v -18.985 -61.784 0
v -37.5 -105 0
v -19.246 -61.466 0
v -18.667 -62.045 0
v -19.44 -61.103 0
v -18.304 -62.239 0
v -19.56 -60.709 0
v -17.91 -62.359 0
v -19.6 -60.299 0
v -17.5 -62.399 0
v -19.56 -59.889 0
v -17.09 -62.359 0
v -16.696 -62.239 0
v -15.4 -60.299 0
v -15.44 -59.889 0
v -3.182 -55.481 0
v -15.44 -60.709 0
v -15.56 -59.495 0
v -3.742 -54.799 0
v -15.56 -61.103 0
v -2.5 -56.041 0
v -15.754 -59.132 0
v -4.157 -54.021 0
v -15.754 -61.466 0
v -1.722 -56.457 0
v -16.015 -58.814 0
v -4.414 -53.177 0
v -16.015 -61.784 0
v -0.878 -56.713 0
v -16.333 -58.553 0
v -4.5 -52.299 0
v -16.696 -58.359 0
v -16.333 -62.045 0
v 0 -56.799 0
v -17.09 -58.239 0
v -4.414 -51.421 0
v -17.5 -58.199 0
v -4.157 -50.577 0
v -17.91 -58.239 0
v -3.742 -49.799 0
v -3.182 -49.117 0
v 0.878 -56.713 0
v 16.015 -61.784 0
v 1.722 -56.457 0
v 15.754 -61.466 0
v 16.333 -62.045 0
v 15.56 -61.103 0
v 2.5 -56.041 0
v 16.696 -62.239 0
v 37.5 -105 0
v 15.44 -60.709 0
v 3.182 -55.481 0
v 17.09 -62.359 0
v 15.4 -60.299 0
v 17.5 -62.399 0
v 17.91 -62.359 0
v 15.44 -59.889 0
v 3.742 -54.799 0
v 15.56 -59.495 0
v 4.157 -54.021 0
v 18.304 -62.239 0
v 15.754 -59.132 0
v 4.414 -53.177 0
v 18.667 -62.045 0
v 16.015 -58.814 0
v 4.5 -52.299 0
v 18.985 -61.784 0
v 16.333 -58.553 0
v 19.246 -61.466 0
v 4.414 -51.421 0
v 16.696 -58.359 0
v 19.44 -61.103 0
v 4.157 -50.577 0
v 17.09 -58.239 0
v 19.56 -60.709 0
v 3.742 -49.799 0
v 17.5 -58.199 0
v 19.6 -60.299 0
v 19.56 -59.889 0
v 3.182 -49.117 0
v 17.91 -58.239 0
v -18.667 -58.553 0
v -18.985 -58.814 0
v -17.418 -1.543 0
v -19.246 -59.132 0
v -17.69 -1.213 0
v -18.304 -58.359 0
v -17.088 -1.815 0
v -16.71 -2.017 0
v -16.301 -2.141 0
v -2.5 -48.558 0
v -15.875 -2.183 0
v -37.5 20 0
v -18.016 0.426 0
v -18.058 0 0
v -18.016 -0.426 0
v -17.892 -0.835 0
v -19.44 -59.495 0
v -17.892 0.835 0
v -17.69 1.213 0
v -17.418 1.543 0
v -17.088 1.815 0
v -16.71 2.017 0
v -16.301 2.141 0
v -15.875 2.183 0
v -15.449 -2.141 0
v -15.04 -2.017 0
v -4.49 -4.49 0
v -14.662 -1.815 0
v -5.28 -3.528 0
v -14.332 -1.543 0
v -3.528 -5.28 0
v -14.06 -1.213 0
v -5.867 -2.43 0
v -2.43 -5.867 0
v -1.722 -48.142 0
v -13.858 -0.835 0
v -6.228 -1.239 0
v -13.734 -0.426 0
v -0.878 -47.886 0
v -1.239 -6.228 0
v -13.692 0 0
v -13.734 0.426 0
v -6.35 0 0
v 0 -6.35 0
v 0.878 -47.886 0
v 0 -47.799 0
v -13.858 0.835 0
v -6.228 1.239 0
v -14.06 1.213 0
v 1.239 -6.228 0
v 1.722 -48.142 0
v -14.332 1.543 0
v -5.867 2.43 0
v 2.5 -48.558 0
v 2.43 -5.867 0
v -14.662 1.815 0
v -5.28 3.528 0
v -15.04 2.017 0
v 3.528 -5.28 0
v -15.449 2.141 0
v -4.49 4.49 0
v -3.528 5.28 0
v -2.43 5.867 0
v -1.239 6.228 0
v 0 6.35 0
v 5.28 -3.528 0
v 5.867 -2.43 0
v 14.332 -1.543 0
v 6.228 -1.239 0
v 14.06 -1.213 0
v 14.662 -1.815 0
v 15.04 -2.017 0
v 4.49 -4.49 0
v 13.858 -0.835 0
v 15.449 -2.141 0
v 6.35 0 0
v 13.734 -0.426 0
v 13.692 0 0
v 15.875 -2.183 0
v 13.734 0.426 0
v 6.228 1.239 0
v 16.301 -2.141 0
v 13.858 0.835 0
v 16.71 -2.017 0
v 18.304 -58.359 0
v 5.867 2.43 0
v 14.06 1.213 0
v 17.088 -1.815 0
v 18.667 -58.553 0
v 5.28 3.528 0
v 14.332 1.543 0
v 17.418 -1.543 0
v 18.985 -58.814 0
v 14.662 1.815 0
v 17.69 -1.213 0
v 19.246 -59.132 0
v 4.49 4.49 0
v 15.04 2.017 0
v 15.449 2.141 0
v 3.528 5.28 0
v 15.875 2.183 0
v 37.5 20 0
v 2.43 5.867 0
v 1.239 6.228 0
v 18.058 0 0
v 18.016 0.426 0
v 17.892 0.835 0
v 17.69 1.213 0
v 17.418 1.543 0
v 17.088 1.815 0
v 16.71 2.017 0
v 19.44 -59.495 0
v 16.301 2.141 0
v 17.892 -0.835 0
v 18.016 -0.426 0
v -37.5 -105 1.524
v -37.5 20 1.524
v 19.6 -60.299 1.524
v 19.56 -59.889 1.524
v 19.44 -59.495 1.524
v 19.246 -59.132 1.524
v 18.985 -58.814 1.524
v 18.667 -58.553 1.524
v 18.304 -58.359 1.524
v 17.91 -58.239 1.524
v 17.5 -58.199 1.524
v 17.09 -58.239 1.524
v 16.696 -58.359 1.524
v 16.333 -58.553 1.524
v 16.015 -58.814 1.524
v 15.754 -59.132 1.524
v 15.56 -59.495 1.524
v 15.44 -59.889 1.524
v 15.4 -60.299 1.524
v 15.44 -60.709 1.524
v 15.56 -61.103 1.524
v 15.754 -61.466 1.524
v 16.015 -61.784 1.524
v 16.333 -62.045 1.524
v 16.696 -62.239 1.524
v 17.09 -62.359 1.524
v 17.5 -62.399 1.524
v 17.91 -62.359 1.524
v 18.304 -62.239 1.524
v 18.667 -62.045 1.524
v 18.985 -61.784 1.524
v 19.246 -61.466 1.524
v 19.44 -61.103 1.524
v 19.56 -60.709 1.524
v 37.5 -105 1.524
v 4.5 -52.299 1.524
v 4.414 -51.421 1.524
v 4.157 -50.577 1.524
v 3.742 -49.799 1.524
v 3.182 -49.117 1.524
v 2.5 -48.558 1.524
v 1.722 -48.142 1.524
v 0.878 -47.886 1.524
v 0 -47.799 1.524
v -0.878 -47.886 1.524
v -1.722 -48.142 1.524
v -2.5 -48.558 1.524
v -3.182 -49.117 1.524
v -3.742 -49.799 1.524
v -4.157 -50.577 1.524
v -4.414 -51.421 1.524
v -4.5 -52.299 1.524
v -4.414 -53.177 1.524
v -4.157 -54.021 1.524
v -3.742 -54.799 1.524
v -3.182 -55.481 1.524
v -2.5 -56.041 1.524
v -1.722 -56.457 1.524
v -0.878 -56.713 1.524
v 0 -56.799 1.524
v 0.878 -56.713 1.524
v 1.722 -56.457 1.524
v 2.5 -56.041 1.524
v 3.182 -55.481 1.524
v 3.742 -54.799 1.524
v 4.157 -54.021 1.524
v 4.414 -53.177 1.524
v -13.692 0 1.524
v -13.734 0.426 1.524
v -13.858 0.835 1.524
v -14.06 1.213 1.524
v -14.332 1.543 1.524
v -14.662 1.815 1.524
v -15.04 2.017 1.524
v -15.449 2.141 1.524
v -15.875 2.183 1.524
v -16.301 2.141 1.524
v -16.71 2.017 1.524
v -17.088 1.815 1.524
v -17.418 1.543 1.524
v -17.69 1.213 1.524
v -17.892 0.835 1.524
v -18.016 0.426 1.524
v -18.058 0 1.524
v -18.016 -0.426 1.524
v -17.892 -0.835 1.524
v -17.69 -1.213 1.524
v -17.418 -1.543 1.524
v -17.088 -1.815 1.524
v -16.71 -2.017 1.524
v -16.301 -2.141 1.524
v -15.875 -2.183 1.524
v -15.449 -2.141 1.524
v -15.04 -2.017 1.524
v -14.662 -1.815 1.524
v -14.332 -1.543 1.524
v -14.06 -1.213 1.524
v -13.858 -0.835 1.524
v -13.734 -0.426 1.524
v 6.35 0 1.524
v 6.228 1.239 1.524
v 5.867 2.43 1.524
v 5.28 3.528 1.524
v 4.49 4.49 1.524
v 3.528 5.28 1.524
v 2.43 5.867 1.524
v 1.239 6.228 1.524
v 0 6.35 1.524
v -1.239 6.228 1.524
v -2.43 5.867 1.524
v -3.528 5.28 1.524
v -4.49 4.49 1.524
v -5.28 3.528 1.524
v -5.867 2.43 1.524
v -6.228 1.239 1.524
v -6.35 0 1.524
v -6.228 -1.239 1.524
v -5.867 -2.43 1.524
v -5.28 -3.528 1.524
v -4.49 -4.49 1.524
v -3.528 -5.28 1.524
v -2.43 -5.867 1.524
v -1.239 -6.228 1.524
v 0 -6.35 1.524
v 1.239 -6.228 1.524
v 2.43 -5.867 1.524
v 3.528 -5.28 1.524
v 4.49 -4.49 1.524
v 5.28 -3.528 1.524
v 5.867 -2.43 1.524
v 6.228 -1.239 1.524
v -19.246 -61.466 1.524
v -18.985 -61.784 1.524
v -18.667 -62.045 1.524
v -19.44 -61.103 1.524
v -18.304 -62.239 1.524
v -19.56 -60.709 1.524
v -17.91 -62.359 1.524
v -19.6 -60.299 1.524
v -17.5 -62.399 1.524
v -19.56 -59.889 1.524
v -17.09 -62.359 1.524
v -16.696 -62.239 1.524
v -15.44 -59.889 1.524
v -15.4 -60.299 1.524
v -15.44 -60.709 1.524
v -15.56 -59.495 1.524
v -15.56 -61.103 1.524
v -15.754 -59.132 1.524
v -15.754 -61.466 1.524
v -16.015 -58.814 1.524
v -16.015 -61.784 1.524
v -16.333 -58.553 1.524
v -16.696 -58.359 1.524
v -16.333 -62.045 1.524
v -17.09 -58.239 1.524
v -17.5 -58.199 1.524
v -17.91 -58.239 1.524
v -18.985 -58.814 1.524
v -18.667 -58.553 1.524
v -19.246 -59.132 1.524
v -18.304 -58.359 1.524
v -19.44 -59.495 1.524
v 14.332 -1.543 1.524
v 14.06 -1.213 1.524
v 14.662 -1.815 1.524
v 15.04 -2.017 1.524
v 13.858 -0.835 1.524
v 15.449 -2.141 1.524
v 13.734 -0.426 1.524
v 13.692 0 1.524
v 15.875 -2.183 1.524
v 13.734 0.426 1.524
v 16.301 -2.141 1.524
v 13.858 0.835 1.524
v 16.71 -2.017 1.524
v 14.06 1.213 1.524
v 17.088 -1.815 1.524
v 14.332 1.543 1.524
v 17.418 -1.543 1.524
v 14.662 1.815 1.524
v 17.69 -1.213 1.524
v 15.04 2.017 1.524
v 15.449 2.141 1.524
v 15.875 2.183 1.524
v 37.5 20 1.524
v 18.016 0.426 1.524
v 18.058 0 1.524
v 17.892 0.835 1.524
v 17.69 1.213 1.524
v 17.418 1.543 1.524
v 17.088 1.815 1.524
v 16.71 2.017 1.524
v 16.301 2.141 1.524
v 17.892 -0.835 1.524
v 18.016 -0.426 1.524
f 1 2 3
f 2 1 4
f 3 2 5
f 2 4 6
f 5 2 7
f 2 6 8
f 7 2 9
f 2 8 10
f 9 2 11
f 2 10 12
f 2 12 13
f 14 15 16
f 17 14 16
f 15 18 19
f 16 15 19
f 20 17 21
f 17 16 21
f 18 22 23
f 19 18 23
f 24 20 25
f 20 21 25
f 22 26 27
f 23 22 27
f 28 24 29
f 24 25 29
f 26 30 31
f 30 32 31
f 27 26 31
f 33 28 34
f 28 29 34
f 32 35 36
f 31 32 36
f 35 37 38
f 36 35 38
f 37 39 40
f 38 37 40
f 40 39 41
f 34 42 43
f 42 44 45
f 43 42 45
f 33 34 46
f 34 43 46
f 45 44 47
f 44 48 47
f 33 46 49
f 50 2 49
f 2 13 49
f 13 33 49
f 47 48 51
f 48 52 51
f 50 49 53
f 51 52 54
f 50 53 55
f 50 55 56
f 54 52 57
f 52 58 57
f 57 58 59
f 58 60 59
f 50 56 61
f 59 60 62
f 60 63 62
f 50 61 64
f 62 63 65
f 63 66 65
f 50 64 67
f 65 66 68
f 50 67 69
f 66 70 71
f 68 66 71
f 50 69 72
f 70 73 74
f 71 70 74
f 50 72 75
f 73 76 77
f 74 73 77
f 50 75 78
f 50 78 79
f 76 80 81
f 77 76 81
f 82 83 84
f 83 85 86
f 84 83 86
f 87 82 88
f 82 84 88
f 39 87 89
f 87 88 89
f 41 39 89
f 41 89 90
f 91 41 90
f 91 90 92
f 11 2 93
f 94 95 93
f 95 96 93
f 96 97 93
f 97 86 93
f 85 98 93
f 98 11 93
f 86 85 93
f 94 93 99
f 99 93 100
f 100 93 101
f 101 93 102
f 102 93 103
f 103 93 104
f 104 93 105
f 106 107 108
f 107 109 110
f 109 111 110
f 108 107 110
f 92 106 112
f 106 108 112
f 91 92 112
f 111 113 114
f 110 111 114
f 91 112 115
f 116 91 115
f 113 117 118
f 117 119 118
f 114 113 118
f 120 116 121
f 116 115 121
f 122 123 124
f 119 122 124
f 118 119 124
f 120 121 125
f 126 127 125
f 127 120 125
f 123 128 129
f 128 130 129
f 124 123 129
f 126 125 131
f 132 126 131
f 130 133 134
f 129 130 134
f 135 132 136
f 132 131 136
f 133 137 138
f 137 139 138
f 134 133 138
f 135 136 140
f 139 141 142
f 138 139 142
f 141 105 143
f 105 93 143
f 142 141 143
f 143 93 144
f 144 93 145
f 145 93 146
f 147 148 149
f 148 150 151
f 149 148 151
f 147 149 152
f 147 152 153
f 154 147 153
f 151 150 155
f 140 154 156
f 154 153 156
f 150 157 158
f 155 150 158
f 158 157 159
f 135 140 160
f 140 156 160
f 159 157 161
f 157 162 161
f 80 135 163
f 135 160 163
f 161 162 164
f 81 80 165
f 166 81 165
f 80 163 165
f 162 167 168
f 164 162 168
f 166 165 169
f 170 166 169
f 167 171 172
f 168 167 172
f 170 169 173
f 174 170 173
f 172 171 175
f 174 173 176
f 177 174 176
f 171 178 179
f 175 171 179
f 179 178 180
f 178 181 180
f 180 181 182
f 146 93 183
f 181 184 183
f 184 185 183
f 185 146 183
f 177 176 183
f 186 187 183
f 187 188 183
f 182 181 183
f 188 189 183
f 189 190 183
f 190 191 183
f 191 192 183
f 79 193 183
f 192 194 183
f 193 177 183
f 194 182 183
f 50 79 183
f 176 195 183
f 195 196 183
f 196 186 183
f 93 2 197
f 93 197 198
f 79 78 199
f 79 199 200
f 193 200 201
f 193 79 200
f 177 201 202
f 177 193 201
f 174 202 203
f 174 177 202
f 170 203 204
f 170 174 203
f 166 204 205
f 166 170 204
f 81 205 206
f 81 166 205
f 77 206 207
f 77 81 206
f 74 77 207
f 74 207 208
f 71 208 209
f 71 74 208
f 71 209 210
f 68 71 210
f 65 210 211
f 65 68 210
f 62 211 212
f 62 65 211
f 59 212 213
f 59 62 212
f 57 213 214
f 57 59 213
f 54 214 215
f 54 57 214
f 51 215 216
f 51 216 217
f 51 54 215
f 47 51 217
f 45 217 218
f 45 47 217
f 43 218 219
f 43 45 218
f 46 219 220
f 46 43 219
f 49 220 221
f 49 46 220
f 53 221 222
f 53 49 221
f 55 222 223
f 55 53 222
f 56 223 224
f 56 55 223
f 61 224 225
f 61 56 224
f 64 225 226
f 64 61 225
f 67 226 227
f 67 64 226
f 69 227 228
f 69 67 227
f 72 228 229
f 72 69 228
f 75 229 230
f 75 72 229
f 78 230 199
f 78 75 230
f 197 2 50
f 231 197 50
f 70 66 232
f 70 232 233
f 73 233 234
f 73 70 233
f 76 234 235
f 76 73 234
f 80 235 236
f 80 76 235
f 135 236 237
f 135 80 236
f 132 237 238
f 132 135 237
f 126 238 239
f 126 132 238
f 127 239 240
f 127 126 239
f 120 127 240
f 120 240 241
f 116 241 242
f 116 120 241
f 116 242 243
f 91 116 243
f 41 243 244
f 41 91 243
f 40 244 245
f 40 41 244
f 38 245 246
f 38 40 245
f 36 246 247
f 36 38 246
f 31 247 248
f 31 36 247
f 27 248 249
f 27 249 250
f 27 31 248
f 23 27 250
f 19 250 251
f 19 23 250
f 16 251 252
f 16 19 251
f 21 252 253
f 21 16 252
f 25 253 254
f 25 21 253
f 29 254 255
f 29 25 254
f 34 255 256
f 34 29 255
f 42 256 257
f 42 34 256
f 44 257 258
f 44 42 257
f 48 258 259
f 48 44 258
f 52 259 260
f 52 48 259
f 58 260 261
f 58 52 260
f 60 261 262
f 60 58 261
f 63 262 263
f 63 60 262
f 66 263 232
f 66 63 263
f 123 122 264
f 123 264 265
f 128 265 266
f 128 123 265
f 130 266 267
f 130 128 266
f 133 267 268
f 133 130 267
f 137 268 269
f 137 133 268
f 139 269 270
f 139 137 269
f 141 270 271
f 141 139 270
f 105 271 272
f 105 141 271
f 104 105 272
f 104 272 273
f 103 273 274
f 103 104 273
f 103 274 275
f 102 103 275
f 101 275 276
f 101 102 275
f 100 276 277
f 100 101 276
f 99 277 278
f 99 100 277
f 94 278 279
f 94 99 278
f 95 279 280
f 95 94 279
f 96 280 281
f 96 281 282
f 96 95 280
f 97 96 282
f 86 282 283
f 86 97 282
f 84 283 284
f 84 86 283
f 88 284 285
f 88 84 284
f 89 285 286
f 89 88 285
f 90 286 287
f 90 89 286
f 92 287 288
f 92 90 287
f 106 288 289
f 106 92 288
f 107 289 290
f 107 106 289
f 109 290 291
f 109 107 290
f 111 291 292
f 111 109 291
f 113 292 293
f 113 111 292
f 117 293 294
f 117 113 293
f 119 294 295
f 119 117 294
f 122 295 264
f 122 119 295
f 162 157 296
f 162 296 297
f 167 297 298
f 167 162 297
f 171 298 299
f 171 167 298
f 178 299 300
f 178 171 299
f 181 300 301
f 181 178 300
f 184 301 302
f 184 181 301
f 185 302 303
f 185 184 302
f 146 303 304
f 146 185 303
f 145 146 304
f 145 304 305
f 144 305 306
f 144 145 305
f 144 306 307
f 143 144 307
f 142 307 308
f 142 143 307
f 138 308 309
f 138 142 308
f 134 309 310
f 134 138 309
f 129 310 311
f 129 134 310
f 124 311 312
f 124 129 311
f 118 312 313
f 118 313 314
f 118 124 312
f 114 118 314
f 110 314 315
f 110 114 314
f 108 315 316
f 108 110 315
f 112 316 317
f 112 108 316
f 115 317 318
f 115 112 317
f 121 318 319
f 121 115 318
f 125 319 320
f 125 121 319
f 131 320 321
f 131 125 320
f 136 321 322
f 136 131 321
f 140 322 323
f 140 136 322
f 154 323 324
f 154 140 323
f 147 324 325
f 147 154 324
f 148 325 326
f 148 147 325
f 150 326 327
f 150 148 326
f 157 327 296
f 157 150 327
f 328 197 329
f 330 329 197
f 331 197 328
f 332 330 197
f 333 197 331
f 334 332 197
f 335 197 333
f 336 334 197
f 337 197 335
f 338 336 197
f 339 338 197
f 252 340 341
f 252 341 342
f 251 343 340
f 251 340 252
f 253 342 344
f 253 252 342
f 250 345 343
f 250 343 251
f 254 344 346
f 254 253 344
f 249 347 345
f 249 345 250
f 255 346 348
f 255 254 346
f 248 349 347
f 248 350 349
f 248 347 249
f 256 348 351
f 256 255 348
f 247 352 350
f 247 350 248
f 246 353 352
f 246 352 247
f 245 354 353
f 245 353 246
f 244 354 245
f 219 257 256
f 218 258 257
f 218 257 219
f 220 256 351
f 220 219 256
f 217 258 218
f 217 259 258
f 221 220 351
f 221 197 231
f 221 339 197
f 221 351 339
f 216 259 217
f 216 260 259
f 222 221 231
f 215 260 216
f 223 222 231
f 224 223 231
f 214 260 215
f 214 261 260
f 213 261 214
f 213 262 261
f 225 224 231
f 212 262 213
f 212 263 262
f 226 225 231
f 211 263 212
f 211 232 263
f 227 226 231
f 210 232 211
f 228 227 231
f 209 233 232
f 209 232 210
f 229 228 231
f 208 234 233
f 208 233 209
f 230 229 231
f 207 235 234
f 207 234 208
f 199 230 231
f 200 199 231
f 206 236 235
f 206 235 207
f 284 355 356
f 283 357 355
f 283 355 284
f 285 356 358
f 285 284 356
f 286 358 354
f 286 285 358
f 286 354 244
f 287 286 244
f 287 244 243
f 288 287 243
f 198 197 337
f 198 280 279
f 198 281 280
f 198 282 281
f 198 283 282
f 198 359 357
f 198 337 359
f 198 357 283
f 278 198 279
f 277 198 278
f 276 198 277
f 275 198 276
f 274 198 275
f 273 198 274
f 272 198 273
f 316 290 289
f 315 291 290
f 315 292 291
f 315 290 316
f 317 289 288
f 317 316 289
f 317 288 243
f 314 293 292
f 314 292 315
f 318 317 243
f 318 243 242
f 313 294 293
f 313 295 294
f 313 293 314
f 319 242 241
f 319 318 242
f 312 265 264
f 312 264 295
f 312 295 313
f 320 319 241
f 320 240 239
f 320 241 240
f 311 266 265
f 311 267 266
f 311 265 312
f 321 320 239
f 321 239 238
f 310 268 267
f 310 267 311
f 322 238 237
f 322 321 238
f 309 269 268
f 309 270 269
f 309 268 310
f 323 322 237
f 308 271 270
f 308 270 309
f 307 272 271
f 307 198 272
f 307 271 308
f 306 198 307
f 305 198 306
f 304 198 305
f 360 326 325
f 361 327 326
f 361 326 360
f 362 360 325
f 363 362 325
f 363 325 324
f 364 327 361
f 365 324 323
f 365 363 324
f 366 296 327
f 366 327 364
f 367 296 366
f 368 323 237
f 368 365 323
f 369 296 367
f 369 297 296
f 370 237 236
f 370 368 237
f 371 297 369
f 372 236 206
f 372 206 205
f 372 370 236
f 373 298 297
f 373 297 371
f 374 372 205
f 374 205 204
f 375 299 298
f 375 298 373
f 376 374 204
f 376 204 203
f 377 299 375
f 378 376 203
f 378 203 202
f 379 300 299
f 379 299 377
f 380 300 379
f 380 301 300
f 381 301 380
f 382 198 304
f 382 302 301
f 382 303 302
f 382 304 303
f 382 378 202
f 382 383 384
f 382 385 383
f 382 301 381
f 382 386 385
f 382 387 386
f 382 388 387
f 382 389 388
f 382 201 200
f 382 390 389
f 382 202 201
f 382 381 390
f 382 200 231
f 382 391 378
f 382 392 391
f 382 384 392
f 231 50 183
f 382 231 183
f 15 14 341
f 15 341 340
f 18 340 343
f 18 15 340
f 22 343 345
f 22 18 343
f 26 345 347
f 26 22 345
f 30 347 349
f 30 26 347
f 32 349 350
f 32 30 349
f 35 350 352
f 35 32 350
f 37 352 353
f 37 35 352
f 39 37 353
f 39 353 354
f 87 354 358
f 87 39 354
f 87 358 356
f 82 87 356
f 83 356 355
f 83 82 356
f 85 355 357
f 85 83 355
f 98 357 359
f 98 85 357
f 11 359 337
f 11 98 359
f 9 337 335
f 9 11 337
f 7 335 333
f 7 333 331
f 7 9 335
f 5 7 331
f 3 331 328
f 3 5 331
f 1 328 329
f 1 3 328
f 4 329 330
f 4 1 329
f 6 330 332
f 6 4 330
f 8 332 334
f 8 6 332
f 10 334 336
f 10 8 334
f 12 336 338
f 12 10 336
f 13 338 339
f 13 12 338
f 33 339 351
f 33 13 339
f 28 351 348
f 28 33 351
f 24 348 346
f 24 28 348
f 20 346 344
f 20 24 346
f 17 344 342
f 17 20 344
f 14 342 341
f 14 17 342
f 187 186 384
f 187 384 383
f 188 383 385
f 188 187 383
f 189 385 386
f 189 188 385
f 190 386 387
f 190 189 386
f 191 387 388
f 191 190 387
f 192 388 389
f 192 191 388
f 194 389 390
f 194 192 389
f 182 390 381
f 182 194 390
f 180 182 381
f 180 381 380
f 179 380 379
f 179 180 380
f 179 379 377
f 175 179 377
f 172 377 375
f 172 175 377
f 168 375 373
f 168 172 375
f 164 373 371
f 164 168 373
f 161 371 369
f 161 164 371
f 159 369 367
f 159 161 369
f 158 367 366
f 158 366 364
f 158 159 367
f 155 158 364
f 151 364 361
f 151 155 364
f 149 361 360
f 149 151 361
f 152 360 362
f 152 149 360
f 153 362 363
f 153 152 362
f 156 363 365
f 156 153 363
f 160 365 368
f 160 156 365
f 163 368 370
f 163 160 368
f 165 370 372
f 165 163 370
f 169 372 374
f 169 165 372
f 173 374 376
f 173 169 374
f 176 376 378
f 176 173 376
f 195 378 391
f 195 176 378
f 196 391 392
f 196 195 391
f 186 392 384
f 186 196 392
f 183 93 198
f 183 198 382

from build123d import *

# Parameters (mm, degrees)
SKETCH1_W           = 75
SKETCH1_H           = 125
SKETCH1_R           = 4.5
SKETCH1_R_2         = 6.35
SKETCH1_R_3         = 2.1
SKETCH1_R_4         = 2.1828125
BOSS_EXTRUDE1_DEPTH = 1.524


with BuildPart() as part:
    # Sketch1 → Boss-Extrude1 (new body)
    with BuildSketch(Plane.XY):
        with Locations((0, -42.5)):
            Rectangle(SKETCH1_W, SKETCH1_H)
        with Locations((0, -52.299124508)):
            Circle(SKETCH1_R, mode=Mode.SUBTRACT)
        Circle(SKETCH1_R_2, mode=Mode.SUBTRACT)
        with Locations((-17.5, -60.299124508)):
            Circle(SKETCH1_R_3, mode=Mode.SUBTRACT)
        with Locations((17.5, -60.299124508)):
            Circle(SKETCH1_R_3, mode=Mode.SUBTRACT)
        with Locations((-15.875, 0)):
            Circle(SKETCH1_R_4, mode=Mode.SUBTRACT)
        with Locations((15.875, 0)):
            Circle(SKETCH1_R_4, mode=Mode.SUBTRACT)
    extrude(amount=BOSS_EXTRUDE1_DEPTH)


solid = part.part
